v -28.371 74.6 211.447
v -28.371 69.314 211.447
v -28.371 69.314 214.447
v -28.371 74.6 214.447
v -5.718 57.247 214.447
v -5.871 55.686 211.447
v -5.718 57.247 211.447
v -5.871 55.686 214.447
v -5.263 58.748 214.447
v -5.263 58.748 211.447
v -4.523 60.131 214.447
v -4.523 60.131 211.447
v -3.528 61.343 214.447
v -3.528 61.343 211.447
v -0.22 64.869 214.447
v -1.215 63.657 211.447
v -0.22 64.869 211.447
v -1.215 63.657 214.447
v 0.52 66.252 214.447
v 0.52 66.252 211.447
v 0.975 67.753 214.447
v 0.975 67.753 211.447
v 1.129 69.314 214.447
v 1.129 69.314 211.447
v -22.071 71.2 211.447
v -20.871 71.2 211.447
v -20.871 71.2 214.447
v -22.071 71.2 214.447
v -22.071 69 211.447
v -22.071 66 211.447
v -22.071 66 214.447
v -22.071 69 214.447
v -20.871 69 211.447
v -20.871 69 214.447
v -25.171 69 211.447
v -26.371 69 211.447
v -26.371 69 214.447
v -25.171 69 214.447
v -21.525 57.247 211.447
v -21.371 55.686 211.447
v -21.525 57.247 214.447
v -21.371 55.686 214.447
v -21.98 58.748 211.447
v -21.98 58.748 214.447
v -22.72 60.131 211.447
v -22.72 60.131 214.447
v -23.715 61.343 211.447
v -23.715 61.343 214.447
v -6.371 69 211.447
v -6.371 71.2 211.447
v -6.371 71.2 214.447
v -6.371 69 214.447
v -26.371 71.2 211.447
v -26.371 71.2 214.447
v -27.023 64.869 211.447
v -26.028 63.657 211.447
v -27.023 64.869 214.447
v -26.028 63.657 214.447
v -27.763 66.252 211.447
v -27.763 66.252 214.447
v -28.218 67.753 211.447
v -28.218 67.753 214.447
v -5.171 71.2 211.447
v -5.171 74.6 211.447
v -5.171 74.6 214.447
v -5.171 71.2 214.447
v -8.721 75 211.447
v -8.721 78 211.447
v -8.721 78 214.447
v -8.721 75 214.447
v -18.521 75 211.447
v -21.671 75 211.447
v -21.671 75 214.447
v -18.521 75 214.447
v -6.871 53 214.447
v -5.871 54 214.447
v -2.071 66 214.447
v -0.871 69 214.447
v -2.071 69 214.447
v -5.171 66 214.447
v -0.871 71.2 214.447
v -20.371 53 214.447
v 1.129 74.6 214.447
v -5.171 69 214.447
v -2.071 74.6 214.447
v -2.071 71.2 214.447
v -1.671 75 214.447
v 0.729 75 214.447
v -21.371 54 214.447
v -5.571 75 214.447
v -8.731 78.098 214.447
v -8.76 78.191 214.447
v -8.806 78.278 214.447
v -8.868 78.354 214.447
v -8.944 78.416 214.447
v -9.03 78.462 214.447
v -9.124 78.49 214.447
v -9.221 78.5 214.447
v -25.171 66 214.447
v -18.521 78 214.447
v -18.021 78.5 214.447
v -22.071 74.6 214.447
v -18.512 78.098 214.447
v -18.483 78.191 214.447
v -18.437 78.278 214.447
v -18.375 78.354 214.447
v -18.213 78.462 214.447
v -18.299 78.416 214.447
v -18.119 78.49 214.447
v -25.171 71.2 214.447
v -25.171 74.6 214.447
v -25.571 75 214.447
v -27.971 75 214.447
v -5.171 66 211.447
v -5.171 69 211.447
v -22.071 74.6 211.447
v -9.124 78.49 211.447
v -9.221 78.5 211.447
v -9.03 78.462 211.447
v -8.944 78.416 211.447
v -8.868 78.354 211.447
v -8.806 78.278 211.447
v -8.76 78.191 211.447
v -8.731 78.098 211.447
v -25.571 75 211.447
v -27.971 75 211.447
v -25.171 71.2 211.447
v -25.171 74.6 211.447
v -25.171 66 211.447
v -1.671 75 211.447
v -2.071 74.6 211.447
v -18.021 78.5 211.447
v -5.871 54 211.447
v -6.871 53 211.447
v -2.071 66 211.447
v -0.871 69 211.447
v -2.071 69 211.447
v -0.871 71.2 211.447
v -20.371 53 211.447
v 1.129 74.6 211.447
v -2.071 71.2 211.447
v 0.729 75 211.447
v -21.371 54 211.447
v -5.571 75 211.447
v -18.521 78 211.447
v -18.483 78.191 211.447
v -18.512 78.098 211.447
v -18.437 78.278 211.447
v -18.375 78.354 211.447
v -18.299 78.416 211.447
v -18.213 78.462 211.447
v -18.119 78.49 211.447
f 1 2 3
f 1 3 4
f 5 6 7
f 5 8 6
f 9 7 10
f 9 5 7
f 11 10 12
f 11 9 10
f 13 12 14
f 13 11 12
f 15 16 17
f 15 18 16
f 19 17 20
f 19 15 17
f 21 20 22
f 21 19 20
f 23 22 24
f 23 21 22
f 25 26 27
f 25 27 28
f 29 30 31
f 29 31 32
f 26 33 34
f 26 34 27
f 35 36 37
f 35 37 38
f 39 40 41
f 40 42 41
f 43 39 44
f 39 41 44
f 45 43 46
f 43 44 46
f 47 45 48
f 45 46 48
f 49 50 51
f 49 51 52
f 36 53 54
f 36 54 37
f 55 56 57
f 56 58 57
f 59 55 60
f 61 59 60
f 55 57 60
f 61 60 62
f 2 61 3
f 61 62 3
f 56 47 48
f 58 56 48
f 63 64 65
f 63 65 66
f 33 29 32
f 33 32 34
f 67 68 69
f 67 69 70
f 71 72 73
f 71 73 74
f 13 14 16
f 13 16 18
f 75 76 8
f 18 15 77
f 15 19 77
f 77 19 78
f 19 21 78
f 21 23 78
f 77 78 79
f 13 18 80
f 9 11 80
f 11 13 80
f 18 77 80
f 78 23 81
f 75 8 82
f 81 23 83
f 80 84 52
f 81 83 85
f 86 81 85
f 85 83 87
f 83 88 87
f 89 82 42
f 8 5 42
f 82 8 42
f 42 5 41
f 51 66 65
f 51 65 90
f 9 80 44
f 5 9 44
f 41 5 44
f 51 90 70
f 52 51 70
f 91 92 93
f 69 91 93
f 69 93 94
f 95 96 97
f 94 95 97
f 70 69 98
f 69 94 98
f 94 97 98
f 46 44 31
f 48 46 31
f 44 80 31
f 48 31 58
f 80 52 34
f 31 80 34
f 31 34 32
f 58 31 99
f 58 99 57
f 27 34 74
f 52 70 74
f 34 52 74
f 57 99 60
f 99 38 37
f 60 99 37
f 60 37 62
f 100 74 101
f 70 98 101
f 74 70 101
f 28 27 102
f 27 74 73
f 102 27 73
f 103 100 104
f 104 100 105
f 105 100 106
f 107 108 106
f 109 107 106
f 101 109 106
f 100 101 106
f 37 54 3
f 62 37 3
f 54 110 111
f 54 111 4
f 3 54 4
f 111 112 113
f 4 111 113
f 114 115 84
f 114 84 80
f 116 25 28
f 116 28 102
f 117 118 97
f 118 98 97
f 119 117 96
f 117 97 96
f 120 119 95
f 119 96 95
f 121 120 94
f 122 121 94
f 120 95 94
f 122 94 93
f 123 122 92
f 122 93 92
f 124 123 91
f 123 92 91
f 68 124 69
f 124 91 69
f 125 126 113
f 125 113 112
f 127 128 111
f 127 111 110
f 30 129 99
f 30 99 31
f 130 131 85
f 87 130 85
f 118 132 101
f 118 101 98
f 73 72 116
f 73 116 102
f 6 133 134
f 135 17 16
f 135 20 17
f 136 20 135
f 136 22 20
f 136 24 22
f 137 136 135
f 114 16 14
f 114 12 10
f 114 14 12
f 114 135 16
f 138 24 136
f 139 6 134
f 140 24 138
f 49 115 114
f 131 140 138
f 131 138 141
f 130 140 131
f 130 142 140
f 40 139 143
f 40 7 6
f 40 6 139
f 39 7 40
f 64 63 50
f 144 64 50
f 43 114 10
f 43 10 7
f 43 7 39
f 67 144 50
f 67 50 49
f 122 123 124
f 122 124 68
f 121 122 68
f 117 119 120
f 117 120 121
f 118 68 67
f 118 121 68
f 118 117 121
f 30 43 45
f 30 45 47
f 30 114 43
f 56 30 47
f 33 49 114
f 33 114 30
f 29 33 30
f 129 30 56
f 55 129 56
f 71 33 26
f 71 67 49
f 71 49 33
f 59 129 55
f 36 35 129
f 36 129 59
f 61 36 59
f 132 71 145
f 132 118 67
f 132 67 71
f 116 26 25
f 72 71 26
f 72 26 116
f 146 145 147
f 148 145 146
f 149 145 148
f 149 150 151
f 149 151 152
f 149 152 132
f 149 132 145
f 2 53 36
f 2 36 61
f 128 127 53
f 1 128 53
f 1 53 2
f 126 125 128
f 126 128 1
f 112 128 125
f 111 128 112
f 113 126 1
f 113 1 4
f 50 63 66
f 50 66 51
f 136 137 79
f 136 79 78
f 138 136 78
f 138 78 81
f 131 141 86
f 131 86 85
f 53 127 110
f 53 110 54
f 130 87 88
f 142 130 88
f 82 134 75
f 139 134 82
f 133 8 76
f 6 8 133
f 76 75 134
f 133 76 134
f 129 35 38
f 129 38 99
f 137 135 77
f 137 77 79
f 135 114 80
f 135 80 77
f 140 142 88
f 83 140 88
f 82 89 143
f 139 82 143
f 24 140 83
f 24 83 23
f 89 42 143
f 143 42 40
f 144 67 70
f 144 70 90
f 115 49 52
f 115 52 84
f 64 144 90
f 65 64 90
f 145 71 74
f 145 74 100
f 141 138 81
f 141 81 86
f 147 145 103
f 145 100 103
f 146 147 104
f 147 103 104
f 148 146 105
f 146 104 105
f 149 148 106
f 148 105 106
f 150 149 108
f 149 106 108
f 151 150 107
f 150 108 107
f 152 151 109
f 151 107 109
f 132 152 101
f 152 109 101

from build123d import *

# Parameters (mm, degrees)
PAD096_DEPTH       = 3
FILLET_R           = 0.5
CHAMFER061_SIZE    = 7
CHAMFER062_SIZE    = 0.4
CHAMFER062_FACE6_W = 15.5
CHAMFER062_FACE6_H = 3
PAD097_DEPTH       = 6
CHAMFER063_SIZE    = 1
FILLET065_R        = 8


with BuildPart() as part:
    # Sketch181 (on Binder) → Pad096 (new body)
    with BuildSketch(Plane.XY.offset(211.44686)):
        Polygon((-28.37148, 75), (-25.17148, 75), (-25.17148, 71.2), (-26.37148, 71.2), (-26.37148, 69), (-25.17148, 69), (-25.17148, 66), (-22.07148, 66), (-22.07148, 69), (-20.87148, 69), (-20.87148, 71.2), (-22.07148, 71.2), (-22.07148, 75), (-18.52148, 75), (-18.52148, 78.5), (-8.72148, 78.5), (-8.72148, 75), (-5.17148, 75), (-5.17148, 71.2), (-6.37148, 71.2), (-6.37148, 69), (-5.17148, 69), (-5.17148, 66), (-2.07148, 66), (-2.07148, 69), (-0.87148, 69), (-0.87148, 71.2), (-2.07148, 71.2), (-2.07148, 75), (1.12852, 75), (1.12852, 59), (-28.37148, 59), align=None)
    extrude(amount=PAD096_DEPTH)

    # Fillet
    fillet_edges = [part.edges().sort_by_distance(p)[0] for p in [
        (-18.52148, 78.5, 212.94686),
        (-8.72148, 78.5, 212.94686),
    ]]
    fillet(fillet_edges, radius=FILLET_R)

    # Chamfer061
    chamfer061_edges = [part.edges().sort_by_distance(p)[0] for p in [
        (1.12852, 59, 212.94686),
        (-28.37148, 59, 212.94686),
    ]]
    chamfer(chamfer061_edges, length=CHAMFER061_SIZE)

    # Chamfer062
    chamfer062_edges = [part.edges().sort_by_distance(p)[0] for p in [
        (-28.37148, 75, 212.94686),
        (1.12852, 75, 212.94686),
        (-2.07148, 75, 212.94686),
        (-5.17148, 75, 212.94686),
        (-22.07148, 75, 212.94686),
        (-25.17148, 75, 212.94686),
    ]]
    chamfer(chamfer062_edges, length=CHAMFER062_SIZE)

    # Chamfer062 Face6 → Pad097 (add)
    with BuildSketch(Plane(origin=(-13.62148, 59, 212.94686), x_dir=(-1, 0, 0), z_dir=(0, -1, 0))):
        Rectangle(CHAMFER062_FACE6_W, CHAMFER062_FACE6_H)
    extrude(amount=PAD097_DEPTH)

    # Chamfer063
    chamfer063_edges = [part.edges().sort_by_distance(p)[0] for p in [
        (-5.87148, 53, 212.94686),
        (-21.37148, 53, 212.94686),
    ]]
    chamfer(chamfer063_edges, length=CHAMFER063_SIZE)

    # Fillet065
    fillet065_edges = [part.edges().sort_by_distance(p)[0] for p in [
        (-21.37148, 59, 212.94686),
        (-28.37148, 66, 212.94686),
        (-5.87148, 59, 212.94686),
        (1.12852, 66, 212.94686),
    ]]
    fillet(fillet065_edges, radius=FILLET065_R)


solid = part.part
